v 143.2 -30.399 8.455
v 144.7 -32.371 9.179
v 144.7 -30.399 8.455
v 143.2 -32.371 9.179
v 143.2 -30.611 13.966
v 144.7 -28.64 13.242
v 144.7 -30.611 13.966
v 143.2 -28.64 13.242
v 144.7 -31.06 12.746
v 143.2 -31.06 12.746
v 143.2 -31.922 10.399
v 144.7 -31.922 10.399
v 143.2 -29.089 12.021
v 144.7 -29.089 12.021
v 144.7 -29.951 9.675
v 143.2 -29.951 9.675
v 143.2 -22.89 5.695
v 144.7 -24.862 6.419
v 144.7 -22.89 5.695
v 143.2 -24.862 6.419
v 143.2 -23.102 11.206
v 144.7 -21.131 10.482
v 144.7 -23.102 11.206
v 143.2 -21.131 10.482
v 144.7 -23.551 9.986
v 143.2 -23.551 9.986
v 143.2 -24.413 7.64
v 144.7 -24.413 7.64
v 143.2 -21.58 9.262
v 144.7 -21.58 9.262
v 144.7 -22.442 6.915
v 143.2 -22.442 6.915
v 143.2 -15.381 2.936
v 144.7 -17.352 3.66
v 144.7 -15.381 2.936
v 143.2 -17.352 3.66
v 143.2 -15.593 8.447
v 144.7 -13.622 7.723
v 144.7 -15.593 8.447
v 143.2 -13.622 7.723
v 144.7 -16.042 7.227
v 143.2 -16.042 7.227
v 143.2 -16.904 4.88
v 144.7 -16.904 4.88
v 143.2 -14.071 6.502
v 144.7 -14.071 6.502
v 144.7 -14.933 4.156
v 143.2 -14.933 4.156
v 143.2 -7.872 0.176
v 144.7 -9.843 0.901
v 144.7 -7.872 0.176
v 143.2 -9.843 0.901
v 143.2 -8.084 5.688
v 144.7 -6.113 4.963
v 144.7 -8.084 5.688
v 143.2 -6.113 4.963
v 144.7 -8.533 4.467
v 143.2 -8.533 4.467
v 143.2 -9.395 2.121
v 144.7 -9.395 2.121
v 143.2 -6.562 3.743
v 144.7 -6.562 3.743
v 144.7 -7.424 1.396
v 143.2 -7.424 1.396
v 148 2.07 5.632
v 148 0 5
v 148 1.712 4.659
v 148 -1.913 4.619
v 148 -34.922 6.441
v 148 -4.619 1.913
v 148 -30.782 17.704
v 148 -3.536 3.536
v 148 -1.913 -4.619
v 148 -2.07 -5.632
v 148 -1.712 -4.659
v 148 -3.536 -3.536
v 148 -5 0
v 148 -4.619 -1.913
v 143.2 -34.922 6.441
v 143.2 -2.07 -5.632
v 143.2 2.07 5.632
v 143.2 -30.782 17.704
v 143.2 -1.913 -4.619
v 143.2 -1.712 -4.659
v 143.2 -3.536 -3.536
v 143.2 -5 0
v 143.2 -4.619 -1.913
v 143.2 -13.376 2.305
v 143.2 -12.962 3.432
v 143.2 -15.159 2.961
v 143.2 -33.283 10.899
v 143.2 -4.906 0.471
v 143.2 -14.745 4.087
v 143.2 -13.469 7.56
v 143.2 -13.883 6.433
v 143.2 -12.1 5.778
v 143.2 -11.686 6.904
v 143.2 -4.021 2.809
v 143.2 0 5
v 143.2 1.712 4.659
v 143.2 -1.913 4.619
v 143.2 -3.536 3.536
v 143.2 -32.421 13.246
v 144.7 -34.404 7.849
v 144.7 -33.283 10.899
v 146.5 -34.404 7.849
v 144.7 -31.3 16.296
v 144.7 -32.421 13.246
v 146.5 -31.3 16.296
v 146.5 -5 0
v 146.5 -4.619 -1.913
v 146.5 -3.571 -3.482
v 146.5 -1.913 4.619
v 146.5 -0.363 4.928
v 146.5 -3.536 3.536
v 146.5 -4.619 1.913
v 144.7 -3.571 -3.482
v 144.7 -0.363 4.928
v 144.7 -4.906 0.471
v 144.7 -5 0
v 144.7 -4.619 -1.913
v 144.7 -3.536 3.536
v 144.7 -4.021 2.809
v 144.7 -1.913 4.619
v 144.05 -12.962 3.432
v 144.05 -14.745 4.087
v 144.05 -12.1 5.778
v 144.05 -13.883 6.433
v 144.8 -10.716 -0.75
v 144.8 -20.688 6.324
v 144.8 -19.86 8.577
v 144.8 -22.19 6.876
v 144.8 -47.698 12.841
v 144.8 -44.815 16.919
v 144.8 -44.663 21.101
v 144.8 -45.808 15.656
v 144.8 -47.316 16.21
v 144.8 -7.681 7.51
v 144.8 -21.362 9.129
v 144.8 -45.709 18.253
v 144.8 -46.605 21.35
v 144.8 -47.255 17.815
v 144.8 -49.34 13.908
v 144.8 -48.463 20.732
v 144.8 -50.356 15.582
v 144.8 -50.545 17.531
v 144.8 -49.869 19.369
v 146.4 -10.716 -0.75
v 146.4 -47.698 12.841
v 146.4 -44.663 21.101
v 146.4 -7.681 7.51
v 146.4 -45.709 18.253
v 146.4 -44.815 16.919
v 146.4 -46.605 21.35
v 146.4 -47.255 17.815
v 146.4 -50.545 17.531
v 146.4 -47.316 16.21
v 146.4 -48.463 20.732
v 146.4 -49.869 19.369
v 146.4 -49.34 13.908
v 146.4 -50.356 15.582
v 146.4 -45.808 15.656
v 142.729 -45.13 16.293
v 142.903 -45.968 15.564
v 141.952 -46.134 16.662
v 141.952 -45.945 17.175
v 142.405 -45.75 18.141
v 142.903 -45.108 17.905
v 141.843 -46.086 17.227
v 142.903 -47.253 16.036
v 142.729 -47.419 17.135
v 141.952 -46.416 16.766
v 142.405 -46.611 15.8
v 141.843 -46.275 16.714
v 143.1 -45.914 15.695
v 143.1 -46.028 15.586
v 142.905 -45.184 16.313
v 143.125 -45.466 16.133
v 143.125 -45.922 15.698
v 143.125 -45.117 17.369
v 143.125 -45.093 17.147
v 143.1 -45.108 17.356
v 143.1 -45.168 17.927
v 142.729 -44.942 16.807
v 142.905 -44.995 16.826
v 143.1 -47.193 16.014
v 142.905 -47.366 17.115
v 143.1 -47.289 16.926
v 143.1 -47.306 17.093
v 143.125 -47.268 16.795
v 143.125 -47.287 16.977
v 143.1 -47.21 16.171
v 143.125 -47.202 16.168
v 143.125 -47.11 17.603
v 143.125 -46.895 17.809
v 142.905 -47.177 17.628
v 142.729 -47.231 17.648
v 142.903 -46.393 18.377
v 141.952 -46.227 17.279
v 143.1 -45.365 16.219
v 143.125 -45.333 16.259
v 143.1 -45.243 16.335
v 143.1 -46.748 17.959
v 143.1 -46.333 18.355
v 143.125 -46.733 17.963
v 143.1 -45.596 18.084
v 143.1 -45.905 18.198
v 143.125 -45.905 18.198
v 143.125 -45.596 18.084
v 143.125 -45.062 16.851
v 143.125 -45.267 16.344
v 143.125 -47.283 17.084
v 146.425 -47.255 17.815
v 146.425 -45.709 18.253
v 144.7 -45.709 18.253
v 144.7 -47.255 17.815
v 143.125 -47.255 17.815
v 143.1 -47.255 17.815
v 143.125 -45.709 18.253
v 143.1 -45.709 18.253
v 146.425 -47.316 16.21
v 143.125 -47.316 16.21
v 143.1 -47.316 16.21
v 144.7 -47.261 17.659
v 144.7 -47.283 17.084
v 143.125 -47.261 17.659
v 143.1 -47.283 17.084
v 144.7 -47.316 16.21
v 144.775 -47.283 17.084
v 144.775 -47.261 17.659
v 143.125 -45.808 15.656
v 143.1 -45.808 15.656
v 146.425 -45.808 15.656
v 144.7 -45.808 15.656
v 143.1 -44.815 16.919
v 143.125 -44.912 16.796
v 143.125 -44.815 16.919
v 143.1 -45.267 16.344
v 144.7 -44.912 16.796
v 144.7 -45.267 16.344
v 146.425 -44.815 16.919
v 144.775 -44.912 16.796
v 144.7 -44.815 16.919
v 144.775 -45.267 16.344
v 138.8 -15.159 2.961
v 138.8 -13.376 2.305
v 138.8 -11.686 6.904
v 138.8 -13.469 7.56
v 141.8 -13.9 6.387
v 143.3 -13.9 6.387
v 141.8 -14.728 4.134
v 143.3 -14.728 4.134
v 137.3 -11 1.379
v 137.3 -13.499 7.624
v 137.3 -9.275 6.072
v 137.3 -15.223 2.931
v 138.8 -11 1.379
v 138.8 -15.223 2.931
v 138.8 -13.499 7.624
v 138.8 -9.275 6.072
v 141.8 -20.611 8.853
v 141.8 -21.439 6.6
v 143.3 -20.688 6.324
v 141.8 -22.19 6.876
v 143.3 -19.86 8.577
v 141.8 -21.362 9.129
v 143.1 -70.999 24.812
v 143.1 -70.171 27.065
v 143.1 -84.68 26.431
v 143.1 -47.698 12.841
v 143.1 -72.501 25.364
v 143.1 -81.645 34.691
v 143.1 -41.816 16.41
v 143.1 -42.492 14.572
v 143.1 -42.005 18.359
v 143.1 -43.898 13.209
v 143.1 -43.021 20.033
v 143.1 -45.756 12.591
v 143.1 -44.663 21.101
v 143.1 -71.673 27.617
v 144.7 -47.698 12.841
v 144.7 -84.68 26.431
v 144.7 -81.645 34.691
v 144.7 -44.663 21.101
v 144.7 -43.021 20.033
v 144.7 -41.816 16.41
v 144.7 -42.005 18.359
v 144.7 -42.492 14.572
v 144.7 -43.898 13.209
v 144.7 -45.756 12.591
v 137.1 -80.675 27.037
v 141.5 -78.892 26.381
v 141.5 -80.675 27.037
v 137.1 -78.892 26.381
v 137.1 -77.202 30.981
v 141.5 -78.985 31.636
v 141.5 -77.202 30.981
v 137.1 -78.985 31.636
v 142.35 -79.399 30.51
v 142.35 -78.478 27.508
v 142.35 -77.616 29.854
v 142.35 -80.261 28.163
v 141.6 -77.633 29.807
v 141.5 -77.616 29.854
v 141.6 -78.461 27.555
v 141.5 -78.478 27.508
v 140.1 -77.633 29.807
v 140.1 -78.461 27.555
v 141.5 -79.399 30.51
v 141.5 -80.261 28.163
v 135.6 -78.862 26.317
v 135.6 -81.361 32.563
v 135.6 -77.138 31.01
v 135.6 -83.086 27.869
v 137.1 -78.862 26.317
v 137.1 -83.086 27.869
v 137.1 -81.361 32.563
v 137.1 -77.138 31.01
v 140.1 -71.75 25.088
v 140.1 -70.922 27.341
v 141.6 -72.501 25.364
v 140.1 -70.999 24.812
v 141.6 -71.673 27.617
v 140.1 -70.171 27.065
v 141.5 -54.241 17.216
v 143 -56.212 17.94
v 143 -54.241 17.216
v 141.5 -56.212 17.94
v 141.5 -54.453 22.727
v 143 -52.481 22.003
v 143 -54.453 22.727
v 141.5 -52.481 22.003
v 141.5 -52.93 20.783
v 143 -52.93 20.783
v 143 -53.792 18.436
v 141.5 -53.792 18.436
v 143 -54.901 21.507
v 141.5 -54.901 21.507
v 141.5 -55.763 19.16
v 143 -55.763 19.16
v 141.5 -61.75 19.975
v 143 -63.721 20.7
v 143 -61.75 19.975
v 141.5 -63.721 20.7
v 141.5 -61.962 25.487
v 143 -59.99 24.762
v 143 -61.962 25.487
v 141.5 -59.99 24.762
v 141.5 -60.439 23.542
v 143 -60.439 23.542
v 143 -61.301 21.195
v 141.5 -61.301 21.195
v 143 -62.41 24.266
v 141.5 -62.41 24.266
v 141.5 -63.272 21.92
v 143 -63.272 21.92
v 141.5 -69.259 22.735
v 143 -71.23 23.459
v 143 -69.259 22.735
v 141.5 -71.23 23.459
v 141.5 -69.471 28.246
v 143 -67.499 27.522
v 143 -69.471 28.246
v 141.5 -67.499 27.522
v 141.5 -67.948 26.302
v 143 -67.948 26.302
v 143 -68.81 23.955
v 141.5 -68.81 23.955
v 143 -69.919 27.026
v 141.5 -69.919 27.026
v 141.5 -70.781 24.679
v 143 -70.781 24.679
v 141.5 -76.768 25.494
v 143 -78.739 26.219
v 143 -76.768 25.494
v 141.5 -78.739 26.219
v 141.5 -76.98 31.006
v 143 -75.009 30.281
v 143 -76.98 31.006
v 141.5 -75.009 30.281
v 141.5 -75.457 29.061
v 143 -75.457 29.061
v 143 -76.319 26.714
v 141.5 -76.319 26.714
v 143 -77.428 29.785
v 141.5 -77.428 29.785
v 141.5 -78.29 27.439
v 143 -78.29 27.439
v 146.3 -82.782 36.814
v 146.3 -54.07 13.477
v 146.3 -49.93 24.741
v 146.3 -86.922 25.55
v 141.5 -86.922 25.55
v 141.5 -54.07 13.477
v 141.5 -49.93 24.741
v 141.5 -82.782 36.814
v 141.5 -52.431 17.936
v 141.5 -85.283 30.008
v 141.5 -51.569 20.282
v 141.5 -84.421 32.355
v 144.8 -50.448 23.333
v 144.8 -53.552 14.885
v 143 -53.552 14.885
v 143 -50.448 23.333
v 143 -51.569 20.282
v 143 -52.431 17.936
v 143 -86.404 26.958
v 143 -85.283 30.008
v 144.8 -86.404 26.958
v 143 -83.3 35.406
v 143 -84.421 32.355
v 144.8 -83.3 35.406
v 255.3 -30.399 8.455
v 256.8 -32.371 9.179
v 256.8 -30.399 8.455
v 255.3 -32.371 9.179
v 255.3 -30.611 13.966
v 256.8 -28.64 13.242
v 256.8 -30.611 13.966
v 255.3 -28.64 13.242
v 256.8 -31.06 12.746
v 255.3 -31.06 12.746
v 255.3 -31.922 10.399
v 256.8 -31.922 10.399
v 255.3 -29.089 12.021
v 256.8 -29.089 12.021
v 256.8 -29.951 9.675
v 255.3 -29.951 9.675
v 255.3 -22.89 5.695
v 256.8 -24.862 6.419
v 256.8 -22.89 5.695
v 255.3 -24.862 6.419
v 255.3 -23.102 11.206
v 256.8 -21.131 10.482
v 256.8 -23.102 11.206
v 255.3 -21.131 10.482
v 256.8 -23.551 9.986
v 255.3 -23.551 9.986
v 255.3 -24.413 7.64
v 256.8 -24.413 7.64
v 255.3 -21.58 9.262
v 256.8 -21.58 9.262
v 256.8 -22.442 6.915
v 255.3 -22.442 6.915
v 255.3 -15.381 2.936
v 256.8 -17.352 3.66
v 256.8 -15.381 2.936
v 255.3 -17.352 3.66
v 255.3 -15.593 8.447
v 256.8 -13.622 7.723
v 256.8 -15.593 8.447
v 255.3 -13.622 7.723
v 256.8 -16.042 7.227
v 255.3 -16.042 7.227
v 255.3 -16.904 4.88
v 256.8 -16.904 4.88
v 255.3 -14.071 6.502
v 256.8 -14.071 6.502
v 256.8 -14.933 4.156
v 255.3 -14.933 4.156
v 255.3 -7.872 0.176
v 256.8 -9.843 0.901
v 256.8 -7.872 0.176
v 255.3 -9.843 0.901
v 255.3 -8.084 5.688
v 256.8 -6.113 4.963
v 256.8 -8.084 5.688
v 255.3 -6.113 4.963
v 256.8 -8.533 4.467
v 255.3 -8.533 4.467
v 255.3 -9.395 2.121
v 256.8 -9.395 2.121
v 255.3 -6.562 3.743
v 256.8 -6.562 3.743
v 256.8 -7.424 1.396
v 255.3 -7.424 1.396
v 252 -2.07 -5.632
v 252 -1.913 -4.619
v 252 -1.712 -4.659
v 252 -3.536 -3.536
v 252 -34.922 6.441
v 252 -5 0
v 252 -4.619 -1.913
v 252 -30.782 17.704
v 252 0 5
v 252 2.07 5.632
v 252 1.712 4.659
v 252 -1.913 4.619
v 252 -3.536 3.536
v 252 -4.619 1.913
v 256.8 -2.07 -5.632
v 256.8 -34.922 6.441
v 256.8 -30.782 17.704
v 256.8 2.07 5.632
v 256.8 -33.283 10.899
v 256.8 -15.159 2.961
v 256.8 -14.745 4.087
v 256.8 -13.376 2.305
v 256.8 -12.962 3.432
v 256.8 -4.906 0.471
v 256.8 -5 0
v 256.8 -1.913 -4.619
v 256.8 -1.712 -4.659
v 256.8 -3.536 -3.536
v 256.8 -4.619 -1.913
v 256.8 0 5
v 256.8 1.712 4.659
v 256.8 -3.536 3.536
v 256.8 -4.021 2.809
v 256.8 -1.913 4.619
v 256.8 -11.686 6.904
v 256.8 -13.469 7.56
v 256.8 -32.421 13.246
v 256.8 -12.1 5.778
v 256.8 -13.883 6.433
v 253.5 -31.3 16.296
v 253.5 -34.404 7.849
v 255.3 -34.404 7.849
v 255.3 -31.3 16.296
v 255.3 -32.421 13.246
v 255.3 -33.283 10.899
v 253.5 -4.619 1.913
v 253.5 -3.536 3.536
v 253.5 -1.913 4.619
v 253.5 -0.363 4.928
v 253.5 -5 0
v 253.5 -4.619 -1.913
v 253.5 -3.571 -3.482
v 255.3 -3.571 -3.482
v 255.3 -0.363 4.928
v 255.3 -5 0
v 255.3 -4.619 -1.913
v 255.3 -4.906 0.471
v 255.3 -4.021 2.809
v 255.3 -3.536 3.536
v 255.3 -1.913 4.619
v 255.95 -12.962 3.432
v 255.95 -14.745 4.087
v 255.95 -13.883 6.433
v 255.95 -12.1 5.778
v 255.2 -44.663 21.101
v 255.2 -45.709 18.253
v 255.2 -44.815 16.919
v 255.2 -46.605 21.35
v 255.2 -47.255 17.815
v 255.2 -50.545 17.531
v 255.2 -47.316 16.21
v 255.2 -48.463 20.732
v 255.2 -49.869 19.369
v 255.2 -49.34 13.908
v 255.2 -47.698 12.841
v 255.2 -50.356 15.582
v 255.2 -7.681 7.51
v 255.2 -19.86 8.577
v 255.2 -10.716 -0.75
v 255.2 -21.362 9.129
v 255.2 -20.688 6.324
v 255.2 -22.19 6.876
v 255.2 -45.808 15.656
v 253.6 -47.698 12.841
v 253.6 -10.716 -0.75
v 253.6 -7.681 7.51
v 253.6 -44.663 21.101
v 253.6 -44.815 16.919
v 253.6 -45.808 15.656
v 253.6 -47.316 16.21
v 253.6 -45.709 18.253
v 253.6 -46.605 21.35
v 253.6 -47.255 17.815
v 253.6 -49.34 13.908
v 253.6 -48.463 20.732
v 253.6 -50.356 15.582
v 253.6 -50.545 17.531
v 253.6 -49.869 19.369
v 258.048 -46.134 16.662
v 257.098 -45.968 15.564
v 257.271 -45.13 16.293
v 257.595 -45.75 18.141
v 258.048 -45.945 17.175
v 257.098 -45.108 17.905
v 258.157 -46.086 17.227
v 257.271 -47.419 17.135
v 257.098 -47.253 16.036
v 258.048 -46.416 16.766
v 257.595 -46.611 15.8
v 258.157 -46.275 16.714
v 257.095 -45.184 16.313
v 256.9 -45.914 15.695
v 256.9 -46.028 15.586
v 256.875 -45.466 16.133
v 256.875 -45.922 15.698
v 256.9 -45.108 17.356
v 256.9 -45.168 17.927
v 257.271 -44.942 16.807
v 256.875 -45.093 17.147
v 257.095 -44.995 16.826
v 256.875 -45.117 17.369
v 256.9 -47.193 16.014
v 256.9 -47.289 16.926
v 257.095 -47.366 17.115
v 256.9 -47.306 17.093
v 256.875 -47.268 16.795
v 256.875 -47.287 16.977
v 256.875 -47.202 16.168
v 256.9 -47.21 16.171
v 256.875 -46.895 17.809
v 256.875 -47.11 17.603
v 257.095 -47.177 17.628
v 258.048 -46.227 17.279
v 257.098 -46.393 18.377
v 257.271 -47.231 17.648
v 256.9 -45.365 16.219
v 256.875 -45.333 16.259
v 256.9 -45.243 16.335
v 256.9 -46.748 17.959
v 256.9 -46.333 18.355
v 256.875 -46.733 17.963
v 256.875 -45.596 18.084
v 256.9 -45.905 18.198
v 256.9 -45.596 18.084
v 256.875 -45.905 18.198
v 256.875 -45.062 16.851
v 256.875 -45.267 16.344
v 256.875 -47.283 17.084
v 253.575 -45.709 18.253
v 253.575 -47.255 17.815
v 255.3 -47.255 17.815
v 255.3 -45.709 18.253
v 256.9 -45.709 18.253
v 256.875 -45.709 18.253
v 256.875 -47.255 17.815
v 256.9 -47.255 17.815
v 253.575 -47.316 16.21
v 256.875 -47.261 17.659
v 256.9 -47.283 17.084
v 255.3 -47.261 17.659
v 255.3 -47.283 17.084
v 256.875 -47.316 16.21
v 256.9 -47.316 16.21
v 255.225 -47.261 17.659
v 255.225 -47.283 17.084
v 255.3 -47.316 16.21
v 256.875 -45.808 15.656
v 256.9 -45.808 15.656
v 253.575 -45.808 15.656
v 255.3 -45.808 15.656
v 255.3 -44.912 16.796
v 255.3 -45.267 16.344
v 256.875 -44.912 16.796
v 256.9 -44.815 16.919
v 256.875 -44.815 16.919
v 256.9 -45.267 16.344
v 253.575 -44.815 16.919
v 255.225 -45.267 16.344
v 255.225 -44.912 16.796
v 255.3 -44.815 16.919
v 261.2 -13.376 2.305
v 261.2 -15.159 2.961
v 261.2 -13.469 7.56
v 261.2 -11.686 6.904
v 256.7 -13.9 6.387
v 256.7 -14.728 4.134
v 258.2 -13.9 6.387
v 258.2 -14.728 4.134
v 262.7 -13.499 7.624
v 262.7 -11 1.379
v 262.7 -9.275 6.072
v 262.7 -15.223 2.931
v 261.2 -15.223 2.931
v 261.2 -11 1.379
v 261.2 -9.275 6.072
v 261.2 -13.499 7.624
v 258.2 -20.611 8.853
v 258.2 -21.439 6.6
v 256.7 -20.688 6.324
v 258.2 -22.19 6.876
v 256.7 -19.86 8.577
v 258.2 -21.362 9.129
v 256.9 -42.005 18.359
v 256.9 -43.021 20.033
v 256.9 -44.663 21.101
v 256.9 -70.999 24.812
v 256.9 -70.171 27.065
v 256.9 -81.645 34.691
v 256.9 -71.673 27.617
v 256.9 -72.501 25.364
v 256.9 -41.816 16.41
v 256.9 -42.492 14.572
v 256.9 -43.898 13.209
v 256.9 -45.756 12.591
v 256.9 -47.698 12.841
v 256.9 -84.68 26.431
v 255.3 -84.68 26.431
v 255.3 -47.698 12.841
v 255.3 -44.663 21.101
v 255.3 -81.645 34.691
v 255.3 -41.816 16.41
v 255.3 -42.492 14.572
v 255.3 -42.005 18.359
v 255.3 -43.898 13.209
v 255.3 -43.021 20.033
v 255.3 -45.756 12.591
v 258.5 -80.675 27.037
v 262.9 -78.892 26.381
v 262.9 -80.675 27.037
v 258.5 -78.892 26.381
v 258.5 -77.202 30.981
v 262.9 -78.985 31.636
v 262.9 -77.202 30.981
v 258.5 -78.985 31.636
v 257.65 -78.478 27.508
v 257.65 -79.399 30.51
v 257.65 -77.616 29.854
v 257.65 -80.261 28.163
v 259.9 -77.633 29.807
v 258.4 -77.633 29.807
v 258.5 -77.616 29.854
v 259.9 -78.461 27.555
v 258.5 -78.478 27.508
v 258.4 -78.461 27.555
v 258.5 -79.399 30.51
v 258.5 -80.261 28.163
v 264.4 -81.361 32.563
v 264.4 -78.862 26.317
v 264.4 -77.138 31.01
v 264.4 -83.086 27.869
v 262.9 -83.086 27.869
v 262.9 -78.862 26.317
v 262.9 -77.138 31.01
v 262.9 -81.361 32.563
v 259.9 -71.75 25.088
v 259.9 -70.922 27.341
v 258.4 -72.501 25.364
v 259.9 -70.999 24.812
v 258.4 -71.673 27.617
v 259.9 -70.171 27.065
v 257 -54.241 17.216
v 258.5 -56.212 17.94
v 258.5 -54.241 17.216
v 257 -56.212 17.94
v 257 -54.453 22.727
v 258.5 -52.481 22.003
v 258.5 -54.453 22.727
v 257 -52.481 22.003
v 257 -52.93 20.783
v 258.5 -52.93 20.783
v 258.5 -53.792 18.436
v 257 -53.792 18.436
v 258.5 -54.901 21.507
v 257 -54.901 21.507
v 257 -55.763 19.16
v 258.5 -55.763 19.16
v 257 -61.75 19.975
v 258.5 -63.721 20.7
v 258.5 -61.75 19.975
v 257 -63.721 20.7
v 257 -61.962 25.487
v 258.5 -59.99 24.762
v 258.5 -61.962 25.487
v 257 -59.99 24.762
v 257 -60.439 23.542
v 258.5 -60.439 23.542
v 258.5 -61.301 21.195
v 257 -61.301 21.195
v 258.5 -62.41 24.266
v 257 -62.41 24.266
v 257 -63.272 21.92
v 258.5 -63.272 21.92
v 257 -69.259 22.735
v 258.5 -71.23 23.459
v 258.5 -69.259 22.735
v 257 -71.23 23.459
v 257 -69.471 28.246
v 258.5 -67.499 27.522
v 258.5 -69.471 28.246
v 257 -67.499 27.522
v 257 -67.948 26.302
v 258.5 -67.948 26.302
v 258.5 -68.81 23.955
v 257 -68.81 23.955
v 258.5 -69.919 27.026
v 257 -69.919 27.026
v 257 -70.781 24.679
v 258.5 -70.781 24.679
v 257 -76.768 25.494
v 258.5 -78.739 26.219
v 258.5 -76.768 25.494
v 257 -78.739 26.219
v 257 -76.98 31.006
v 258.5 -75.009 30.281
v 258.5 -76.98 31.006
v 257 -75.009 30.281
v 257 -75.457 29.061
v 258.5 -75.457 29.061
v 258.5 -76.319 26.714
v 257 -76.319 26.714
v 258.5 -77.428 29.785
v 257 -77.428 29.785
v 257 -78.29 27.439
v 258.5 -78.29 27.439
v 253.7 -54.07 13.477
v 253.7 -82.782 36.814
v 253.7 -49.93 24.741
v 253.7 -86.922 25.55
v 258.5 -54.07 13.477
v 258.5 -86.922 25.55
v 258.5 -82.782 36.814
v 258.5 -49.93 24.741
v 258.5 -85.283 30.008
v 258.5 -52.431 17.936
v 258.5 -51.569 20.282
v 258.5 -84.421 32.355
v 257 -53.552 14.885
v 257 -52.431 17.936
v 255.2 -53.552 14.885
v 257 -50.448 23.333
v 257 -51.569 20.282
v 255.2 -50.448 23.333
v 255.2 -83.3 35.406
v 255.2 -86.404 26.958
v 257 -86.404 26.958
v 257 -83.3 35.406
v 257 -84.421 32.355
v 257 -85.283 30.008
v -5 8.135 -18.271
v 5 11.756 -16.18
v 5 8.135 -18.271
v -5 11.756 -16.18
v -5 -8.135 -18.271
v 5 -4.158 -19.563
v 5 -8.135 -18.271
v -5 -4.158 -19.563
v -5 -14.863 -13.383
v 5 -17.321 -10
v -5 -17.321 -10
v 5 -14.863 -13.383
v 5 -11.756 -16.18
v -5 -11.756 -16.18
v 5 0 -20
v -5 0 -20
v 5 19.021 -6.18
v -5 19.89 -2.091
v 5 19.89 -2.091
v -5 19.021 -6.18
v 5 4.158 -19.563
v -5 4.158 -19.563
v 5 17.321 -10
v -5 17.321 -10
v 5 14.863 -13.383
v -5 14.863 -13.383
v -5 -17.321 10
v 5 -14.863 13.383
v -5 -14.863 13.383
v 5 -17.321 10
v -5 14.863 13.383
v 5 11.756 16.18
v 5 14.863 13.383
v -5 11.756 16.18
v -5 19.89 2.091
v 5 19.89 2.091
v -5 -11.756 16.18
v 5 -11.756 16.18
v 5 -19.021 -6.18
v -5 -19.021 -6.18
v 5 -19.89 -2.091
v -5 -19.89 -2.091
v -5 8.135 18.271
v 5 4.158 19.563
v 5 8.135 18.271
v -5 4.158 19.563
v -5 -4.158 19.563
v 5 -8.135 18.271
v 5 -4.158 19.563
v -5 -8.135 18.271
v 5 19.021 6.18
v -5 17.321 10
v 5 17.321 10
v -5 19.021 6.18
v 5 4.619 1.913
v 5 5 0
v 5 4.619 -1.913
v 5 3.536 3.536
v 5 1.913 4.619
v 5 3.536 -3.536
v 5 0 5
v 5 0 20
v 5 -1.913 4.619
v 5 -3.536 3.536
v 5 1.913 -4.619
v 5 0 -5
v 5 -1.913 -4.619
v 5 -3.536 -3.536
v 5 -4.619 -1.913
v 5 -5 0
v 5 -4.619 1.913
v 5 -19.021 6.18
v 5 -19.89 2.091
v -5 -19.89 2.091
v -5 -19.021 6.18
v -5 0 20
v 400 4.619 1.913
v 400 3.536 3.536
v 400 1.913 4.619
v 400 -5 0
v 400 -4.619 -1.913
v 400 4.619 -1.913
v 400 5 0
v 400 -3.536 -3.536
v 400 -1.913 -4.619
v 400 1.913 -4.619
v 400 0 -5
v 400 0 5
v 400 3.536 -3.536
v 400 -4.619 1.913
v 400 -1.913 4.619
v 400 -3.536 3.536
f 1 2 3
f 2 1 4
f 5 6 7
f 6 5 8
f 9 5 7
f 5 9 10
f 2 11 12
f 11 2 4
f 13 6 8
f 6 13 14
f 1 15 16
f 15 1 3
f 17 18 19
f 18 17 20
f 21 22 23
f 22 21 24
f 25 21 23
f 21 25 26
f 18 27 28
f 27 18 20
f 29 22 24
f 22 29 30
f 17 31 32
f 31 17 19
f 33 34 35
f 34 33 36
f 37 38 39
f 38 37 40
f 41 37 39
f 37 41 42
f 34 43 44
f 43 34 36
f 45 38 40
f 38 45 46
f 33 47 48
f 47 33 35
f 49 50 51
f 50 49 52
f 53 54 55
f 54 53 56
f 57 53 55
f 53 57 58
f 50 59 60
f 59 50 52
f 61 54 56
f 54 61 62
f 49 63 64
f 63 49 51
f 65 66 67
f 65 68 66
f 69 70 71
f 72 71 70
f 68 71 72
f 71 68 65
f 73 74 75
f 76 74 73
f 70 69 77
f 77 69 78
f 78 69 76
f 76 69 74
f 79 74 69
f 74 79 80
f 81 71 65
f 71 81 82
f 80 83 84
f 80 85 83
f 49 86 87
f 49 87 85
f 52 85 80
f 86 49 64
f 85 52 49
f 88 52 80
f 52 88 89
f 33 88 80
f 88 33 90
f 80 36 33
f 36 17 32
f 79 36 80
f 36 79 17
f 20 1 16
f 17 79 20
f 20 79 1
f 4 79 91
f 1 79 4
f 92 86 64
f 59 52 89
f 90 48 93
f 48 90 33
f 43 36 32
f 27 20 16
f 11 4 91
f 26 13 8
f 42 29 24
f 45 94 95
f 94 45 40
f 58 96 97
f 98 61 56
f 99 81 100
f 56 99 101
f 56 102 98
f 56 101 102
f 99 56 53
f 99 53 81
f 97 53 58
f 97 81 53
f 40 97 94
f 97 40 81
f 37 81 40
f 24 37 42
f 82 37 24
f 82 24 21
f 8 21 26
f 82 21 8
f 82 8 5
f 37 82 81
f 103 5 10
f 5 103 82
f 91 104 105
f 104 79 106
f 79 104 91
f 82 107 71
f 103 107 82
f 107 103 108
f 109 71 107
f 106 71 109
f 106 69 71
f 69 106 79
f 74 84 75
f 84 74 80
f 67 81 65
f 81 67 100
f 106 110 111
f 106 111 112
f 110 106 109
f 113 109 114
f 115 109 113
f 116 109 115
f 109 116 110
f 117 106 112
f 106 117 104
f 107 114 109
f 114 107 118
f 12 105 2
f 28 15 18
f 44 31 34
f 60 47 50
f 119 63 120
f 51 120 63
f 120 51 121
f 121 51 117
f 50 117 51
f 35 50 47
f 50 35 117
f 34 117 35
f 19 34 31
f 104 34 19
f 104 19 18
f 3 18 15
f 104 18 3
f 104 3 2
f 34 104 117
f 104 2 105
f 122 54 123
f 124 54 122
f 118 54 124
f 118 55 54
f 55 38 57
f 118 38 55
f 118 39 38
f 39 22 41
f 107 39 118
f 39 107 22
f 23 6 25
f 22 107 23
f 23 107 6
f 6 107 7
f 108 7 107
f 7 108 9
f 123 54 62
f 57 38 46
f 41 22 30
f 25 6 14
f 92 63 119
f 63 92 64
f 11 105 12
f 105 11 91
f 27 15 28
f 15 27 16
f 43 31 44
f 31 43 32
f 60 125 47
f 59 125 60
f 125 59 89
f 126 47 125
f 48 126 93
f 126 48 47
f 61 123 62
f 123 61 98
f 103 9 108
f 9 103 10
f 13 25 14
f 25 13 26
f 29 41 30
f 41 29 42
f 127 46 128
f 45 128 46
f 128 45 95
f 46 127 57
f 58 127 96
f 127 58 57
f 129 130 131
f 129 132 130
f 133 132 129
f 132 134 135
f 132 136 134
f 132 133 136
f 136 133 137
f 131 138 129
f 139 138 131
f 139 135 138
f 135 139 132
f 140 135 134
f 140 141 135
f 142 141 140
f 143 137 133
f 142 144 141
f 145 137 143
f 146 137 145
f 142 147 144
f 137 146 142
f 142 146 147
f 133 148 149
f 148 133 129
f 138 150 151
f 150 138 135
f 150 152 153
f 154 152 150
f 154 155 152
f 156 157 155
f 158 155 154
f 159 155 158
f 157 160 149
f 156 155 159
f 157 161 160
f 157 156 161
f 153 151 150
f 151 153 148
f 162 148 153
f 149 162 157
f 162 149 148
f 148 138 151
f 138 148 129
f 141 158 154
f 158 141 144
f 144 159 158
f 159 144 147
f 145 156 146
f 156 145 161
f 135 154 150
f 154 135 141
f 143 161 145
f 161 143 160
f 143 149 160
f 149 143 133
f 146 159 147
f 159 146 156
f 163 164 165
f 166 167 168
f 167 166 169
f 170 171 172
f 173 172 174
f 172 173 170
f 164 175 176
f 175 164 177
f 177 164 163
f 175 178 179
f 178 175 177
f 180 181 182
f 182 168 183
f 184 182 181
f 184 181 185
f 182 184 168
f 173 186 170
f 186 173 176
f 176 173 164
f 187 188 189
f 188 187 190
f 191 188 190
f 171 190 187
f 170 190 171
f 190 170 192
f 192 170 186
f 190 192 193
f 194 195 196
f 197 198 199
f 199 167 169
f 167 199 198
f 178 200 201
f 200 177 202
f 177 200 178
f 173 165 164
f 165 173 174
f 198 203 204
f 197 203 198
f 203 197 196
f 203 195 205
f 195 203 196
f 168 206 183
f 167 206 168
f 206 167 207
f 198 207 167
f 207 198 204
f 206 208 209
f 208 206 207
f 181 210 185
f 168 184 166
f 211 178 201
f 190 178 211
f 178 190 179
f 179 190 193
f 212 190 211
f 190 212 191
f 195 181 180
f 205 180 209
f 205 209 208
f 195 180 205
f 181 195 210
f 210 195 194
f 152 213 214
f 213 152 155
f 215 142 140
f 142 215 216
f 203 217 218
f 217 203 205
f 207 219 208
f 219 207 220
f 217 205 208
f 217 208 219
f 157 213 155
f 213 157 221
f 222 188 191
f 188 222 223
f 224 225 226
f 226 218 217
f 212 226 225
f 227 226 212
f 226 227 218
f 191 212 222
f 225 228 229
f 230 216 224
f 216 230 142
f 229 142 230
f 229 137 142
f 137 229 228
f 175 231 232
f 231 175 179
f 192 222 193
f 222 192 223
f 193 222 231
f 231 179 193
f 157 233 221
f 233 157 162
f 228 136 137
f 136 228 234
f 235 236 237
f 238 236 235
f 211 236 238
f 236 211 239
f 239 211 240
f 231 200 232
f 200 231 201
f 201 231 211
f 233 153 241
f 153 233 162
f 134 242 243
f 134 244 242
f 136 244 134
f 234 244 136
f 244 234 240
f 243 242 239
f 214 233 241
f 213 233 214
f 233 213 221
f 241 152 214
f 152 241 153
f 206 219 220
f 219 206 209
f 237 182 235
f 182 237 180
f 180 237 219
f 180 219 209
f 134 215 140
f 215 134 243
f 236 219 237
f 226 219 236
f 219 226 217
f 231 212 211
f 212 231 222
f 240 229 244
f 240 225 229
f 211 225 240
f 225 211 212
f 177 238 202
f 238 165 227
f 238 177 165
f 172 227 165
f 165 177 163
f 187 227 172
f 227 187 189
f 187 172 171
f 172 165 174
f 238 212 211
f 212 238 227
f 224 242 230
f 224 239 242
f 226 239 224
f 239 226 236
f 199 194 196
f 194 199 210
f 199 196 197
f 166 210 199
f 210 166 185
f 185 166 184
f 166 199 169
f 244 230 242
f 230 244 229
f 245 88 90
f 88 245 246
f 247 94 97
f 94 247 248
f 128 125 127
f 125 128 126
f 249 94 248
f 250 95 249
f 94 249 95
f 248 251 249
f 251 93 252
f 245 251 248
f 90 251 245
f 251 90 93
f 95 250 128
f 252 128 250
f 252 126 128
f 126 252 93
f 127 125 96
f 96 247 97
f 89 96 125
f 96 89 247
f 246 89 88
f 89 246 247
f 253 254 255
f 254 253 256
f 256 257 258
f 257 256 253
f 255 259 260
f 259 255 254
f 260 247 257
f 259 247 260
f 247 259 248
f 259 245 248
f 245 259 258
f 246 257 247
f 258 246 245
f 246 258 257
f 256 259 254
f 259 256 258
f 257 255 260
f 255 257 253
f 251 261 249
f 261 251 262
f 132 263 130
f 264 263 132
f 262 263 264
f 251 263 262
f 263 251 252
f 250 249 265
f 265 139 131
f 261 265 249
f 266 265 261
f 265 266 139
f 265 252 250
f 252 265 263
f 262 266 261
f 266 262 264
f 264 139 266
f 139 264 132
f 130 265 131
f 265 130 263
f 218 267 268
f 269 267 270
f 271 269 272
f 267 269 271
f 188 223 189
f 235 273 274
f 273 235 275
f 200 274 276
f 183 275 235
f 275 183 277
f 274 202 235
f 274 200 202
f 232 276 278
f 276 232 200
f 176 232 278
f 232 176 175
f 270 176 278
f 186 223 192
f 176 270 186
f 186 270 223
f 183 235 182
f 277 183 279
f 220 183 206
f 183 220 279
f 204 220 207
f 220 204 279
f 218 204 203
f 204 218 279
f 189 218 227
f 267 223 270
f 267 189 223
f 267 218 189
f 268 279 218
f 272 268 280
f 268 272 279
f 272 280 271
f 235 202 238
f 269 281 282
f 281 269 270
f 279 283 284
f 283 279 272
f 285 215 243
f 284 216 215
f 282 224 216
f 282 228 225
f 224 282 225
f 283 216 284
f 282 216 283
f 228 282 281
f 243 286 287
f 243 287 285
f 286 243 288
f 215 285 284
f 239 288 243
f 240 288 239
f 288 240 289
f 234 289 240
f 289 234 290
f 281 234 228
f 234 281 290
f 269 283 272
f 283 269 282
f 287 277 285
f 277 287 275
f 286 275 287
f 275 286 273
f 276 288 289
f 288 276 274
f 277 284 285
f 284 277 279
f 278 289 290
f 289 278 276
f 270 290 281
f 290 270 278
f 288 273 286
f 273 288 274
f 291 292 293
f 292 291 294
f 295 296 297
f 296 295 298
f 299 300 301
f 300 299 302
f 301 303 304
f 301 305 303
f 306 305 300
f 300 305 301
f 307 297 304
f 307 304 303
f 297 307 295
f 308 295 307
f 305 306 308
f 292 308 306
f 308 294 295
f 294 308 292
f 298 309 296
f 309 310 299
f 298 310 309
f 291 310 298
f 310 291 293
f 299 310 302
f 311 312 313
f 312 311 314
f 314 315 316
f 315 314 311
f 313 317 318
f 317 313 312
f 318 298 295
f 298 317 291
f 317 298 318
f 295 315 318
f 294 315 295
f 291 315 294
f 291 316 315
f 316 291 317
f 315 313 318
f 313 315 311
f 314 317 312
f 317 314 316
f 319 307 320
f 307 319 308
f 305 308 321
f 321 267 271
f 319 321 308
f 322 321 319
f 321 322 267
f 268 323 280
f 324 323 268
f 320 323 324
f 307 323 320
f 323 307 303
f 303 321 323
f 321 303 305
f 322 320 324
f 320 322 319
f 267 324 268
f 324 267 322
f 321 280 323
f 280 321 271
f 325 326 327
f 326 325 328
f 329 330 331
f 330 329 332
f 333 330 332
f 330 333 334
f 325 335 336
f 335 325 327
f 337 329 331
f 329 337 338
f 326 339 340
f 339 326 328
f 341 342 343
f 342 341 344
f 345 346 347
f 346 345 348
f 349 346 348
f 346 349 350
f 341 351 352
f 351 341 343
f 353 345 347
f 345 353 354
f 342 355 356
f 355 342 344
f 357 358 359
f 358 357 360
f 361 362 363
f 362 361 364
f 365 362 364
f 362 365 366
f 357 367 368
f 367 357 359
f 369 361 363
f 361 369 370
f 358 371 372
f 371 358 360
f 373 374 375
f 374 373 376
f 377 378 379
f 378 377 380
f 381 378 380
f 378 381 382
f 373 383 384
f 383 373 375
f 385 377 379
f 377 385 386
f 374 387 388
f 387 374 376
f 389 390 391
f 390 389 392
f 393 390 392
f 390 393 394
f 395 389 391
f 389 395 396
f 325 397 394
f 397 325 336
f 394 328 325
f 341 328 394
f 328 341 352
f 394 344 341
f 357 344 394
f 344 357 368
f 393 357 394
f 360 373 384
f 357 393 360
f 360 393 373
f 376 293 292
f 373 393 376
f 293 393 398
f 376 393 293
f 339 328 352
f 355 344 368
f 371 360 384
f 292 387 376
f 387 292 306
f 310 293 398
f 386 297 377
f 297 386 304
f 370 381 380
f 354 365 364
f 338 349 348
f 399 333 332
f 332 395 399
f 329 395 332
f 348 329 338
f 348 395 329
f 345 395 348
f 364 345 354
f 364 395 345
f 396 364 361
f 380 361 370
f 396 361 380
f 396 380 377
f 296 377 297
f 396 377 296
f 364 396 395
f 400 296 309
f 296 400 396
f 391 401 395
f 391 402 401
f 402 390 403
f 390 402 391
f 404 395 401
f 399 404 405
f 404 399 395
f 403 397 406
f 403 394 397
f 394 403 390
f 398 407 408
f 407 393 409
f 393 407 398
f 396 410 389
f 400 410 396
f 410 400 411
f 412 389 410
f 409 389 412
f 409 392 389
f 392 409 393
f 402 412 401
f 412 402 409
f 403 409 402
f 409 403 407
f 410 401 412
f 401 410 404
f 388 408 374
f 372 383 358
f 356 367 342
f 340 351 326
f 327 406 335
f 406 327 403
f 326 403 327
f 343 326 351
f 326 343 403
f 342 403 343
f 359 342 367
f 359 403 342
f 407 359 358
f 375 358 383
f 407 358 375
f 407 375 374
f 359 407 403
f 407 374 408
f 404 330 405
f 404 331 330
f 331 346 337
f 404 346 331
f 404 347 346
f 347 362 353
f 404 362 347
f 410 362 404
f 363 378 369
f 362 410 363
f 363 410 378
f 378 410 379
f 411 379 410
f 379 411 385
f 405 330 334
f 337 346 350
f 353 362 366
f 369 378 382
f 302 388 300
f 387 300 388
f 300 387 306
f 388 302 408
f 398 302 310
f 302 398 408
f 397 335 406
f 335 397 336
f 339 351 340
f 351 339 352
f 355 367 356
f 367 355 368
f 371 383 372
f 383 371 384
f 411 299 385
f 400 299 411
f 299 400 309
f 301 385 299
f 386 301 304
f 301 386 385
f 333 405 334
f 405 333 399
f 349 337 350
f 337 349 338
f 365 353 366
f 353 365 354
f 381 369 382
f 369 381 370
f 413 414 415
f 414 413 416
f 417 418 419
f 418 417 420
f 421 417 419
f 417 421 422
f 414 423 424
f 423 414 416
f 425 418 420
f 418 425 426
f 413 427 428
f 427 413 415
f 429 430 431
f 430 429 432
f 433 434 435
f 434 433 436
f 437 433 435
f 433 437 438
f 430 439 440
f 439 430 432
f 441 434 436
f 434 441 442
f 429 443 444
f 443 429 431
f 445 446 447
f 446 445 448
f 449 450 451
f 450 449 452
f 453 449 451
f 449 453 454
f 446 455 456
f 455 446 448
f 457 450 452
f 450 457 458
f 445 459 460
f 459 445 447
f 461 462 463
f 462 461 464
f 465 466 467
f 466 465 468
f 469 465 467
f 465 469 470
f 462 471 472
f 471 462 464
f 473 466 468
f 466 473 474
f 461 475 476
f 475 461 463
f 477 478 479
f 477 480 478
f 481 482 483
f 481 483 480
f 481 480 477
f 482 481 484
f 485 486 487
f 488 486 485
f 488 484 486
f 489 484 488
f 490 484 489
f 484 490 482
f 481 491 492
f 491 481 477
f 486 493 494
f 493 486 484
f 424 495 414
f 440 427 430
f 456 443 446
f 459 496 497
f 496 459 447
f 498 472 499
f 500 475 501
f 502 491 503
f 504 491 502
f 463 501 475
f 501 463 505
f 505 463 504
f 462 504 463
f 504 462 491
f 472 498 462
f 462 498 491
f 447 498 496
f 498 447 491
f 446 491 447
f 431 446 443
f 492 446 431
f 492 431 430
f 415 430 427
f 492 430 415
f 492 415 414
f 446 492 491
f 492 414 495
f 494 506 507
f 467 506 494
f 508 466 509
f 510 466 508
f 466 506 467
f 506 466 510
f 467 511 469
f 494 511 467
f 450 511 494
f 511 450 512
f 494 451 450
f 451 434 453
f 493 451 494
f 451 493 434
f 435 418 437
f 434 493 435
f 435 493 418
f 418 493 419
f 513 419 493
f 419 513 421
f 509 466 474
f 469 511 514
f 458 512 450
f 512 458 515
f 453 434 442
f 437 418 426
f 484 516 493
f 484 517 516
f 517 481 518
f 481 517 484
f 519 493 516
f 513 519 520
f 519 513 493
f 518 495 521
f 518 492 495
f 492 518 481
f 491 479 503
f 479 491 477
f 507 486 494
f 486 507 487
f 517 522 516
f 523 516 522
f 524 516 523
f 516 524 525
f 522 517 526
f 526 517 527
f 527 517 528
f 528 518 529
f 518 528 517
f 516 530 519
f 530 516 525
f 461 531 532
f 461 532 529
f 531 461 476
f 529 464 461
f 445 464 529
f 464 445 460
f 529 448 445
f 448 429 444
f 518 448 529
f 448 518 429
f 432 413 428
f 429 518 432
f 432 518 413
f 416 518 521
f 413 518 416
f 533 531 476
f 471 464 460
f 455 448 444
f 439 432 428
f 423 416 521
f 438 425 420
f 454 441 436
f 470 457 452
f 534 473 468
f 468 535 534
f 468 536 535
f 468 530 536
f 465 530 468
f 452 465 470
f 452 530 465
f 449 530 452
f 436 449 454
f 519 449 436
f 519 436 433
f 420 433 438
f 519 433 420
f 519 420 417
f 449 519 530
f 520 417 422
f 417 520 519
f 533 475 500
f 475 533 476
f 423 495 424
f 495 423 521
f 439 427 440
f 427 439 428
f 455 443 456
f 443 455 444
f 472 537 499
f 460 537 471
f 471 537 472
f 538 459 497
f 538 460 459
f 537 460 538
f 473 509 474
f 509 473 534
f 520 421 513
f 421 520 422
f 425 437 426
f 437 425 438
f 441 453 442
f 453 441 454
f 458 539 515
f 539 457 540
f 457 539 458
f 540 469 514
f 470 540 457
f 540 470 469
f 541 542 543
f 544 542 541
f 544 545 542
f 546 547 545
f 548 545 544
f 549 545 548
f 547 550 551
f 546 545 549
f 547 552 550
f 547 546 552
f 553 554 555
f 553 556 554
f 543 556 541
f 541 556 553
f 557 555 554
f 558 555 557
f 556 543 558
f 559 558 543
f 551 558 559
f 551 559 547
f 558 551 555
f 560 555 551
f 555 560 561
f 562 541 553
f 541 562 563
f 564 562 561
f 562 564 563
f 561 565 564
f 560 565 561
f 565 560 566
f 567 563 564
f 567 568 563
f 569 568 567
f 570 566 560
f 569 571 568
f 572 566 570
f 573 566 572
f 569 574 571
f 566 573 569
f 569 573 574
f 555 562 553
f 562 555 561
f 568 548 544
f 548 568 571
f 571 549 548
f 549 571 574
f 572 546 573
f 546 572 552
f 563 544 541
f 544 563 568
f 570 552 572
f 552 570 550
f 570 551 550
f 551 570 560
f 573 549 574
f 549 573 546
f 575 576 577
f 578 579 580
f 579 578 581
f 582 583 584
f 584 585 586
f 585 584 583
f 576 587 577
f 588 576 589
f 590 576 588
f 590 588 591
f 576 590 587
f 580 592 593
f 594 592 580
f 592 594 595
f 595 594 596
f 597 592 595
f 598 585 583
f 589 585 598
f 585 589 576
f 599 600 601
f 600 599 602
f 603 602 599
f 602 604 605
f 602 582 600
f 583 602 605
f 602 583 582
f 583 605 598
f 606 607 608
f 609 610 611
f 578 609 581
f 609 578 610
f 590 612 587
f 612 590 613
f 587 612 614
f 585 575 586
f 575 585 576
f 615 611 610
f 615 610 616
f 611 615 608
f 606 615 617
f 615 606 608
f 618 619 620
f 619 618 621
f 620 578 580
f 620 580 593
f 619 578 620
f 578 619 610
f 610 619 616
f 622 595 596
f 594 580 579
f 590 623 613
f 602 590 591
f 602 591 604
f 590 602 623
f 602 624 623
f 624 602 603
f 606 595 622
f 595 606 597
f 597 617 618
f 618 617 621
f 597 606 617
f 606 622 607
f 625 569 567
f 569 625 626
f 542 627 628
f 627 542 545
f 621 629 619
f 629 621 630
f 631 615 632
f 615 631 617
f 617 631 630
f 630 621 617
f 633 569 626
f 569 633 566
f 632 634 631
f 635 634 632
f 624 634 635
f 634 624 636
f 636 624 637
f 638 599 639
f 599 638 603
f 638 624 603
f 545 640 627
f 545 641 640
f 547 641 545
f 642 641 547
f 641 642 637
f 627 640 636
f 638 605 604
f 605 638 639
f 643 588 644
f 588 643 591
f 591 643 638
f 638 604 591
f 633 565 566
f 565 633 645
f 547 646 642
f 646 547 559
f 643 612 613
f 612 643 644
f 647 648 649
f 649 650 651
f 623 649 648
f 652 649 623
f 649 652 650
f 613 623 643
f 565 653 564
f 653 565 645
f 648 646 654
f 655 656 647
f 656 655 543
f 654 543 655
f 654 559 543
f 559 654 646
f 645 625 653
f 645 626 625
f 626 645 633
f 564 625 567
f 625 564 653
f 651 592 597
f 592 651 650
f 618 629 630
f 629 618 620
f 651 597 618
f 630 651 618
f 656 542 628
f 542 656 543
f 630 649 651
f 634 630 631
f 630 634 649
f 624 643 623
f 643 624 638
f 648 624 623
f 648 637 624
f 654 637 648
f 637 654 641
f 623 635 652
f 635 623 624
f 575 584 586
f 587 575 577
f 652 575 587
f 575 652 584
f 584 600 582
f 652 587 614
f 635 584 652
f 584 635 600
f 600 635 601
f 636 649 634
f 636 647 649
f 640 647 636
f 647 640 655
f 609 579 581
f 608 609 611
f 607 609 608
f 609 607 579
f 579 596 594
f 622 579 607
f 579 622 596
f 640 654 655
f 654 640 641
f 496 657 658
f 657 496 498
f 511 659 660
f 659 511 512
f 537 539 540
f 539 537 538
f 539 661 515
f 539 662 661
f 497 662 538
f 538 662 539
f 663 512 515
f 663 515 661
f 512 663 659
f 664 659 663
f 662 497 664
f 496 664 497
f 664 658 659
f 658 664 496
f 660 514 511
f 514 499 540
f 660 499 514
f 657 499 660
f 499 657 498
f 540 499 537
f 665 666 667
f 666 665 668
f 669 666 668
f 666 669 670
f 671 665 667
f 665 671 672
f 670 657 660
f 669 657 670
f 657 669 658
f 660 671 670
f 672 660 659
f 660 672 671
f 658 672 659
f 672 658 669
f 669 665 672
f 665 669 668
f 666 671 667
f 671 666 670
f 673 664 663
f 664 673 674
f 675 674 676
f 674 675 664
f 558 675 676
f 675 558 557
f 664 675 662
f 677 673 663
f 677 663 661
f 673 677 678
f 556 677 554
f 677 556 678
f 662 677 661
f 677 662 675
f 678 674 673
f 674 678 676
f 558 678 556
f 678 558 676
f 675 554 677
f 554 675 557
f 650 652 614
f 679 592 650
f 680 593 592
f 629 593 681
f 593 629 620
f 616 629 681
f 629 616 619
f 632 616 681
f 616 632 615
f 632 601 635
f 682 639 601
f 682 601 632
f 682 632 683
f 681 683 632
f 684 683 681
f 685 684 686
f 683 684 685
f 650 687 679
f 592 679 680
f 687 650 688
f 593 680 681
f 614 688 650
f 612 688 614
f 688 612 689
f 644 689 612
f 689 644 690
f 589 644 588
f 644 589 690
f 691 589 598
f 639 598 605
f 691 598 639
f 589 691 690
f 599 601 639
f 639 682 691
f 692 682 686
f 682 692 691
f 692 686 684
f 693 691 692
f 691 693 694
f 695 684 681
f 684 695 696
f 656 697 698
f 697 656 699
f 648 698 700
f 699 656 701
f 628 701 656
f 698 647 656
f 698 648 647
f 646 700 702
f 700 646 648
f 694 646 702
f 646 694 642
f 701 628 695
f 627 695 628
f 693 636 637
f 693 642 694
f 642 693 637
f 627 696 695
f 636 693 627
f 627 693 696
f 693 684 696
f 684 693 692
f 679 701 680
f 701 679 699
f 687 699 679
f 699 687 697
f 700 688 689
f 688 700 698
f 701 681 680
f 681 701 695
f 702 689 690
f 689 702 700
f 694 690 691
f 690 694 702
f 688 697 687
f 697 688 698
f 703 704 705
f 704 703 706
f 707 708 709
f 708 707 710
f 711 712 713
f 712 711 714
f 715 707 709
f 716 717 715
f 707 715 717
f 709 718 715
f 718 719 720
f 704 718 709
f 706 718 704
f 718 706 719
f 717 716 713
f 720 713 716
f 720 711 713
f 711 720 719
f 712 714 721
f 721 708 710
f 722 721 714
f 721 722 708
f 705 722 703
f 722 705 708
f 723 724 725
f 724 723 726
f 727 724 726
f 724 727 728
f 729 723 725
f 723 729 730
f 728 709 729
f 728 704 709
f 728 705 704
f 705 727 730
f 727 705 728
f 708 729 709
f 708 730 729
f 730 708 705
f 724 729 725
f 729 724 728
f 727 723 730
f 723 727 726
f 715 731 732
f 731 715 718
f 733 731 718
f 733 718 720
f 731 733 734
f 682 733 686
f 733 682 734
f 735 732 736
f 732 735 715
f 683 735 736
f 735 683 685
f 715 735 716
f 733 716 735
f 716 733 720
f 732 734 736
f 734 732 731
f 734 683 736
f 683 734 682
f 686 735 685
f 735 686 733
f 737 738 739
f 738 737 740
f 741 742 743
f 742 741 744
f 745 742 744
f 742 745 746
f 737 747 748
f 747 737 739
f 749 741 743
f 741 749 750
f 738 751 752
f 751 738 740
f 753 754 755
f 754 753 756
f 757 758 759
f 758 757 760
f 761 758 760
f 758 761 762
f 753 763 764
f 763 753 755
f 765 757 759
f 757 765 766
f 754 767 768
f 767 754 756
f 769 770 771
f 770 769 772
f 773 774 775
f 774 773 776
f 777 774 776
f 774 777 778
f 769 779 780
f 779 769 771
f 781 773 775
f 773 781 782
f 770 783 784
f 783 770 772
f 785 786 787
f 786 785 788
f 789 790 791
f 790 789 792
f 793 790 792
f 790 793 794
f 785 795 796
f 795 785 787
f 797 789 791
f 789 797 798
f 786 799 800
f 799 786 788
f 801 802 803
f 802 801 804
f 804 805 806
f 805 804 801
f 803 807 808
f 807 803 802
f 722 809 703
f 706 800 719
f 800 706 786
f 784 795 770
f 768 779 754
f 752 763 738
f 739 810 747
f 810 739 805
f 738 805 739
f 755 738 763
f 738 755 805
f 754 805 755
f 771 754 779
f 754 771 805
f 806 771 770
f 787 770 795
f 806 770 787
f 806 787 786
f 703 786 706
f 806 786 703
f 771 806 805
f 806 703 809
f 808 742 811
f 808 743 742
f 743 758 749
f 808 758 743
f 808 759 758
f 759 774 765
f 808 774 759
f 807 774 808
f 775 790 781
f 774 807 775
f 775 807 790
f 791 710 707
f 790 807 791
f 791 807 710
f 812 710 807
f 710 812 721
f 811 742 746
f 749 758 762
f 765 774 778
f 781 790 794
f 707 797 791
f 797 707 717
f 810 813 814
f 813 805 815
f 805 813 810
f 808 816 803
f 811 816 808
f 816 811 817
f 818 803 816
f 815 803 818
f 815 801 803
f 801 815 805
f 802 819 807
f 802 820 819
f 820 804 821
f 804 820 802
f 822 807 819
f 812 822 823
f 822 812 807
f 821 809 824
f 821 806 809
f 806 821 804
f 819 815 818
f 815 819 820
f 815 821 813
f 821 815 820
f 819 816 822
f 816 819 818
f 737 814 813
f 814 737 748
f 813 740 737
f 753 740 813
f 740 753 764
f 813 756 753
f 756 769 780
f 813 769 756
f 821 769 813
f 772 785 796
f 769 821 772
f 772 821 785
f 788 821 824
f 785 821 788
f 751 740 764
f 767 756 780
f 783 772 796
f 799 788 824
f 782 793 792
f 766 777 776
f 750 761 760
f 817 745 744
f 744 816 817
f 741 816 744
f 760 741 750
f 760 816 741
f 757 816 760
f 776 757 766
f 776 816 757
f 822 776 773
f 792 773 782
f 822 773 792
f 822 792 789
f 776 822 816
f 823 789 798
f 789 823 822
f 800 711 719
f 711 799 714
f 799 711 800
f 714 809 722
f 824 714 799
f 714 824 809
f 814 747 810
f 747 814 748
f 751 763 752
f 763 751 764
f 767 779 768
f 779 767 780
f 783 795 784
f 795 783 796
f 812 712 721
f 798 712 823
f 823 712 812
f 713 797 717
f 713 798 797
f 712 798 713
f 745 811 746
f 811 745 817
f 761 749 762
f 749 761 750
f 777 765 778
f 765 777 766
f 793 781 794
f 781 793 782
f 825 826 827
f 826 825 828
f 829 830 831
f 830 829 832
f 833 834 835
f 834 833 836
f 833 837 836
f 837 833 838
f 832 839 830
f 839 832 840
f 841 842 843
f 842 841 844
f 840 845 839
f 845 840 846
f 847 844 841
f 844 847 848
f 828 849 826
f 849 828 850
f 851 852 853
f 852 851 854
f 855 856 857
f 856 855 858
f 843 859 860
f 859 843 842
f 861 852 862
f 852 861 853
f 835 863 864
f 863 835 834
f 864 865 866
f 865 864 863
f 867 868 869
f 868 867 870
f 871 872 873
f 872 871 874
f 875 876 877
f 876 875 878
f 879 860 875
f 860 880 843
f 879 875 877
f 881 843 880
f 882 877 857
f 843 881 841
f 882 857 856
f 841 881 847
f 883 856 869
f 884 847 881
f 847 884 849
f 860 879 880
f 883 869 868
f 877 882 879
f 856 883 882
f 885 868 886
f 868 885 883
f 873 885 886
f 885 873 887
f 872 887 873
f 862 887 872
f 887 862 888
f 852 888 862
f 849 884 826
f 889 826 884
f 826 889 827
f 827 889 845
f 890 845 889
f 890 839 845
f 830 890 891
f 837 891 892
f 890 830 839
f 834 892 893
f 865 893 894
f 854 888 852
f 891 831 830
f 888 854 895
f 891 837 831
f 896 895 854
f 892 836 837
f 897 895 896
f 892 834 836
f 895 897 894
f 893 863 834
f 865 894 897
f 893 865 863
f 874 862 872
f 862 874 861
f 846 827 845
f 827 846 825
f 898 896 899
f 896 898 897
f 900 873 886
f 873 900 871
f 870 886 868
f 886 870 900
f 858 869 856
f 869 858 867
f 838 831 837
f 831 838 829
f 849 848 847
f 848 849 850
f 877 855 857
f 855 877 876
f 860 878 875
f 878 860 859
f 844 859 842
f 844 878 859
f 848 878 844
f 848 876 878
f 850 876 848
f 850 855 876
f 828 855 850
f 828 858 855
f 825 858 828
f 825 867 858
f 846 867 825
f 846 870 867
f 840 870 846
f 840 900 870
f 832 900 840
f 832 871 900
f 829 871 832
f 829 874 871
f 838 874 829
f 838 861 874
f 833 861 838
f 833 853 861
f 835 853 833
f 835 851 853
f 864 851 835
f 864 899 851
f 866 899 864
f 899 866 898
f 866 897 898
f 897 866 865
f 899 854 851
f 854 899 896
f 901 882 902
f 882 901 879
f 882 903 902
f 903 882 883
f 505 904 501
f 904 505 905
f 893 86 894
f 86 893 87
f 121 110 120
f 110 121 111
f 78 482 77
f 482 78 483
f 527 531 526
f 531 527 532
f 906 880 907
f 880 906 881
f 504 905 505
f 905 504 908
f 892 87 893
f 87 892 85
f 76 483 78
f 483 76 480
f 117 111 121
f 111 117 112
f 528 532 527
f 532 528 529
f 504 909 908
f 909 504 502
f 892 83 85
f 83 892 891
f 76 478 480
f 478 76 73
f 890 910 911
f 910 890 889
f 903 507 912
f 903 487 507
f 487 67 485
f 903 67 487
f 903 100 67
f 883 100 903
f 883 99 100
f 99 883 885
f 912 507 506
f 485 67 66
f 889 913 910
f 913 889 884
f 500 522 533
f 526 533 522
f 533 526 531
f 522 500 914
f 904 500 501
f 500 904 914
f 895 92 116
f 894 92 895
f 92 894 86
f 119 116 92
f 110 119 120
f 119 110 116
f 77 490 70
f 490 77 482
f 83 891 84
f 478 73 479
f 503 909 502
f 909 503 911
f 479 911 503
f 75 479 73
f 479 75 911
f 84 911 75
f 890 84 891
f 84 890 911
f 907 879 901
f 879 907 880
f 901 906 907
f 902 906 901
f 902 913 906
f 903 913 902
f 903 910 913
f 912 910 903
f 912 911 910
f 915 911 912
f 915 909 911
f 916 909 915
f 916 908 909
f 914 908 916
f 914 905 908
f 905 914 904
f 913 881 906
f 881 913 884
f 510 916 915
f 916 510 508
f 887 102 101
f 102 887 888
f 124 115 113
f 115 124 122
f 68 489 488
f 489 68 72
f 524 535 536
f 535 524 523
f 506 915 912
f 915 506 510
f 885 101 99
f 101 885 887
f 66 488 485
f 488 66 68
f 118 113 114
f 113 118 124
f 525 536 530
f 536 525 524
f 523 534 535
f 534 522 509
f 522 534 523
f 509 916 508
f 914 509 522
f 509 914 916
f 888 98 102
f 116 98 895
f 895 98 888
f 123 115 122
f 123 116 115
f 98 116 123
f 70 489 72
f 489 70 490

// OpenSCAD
// file: paddle_bar.scad
include <parameters.scad>;

module paddle_bar(){
	cylinder(h= paddle_bar_h,r=paddle_bar_r);
}

paddle_bar();
// file: paddle_upper.scad
include <paddle_bar.scad>;

module paddle_upper(){
	notches = round((paddle_upper_l-hook_t-shell*2)/upper_length_resolution-0.5);

	difference(){
		cube([paddle_upper_t, paddle_upper_l, paddle_upper_w], center = true);
		cube([paddle_upper_t-shell*2, paddle_upper_l+1, paddle_upper_w-shell*2], center = true);
		translate([-paddle_upper_t/2,0,0])
			cube([paddle_upper_t, paddle_upper_l+1, groove], center = true);
		translate([-paddle_upper_t/2,+paddle_upper_l/2-hook_t/2-shell,0])
			for(i = [0:notches]){
				translate([0,-upper_length_resolution*i,0])
					cube([paddle_upper_t+1, hook_t+hook_gap, hook_w+hook_gap], center = true);
			}
	}
}

paddle_upper();
// file: forearm.scad
include <parameters.scad>;
use <paddle_upper.scad>;

module bolt(){
	module slug(){
		rotate([0,90,0])
			cylinder(h = bolt_h, r = bolt_r, center = true);
		translate([bolt_h/2,0,0])
			difference(){
				sphere(r = head_r, center = true);
				translate([-head_r,0,0])
					cube([head_r*2,head_r*2,head_r*2], center = true);
				translate([0,head_r+bolt_r,0])
					cube([head_r*2,head_r*2,head_r*2], center = true);
				translate([0,-head_r-bolt_r,0])
					cube([head_r*2,head_r*2,head_r*2], center = true);
		}
	}
	difference(){
		slug();
		translate([bolt_h*0.5,0,0])
				cube([bolt_h,bolt_r*2+0.1,bolt_groove],center = true);
	}
}

module clip(){
	cube([clip_h ,forearm_t,groove-slide_gap], center = true);
	translate([clip_h/2-shell/2,-clip_l/2,0]){
		cube([shell,clip_l,groove-slide_gap], center = true);
		translate([hook_h/2-shell,-clip_l/2,0]){
			cube([hook_h,hook_t-slide_gap,hook_w-slide_gap],center = true);
			translate([hook_h/2,-thumb_hook_l/2+hook_t/2,0])
				cube([thumb_hook_t,thumb_hook_l,hook_w],center = true);
		}
	}
}

module forearm(bolt){
	module slug(){
		cube([forearm_t, forearm_l, forearm_w], center = true);
		translate([0,forearm_l/2,0]){
			rotate([0,90,0])
				cylinder(h = forearm_t, r = wrist_joint_outer, center = true);
		}
	}
	if(bolt){
		slug();
		translate([0,forearm_l/2,0]){
			translate([bolt_h/4,0,0]){
				bolt();
			}
		}
	}else{
		difference(){
			slug();
			translate([0,forearm_l/2,0]){
				translate([bolt_h/4,0,0]){
					bolt();
				}
			}
		}
		
	}

	translate([-forearm_t/2+clip_h/2,-forearm_l/2+clip_l+thumb_hook_l])
		clip();
}

module lower_forearm(pos2){
	translate([0,forearm_l/2,0]){
		mirror([0,1,0]){
			forearm(false);
			mirror([1,0,0])
					translate([0,-upper_length_resolution/2-upper_length_resolution*pos2,0])
						paddle_upper();
		}
	}
}

lower_forearm(1);
//forearm(true);
// file: side.scad
include <parameters.scad>;
use <forearm.scad>;
use <paddle_upper.scad>;

module side(){
	paddle_upper();
	translate([0,upper_length_resolution/2+upper_length_resolution*pos1,0]){ 
		mirror([1,0,0]){
			forearm(true);
			translate([forearm_t+slide_gap,forearm_l/2,0]){
				rotate([-wrist_angle,0,0]){
					lower_forearm(pos2);
				}
			}
		}
	}
}

side();
// file: paddle.scad
include <parameters.scad>;
use <side.scad>;

module paddle(narrow){
	separation1 = paddle_bar_h-paddle_upper_t-slide_gap*40;
	separation2 = paddle_bar_h+paddle_upper_t+slide_gap*40;
	if (narrow){
		translate([separation1/2,paddle_upper_l/2,0])
			side();
		translate([-separation1/2,paddle_upper_l/2,0])
			mirror([1,0,0])
				side();
	}else{
		translate([-separation2/2,paddle_upper_l/2,0])
			side();
		translate([separation2/2,paddle_upper_l/2,0])
			mirror([1,0,0])
				side();
	}
}

paddle(true);
paddle(false);
// file: paddle_shaft.scad
include <parameters.scad>;

module paddle_shaft(){
	cylinder(r = paddle_shaft_r, h = paddle_shaft_h, center = true);
}

paddle_shaft();
// file: paddle_gear.scad
include <parameters.scad>;

module paddle_gear(){
	cylinder(r = paddle_gear_r, h = paddle_gear_h, center = true);
}

paddle_gear();
// file: parameters.scad
//All parameters

link_gear_r = 25;
link_gear_h = 10;

paddle_gear_r = 20;
paddle_gear_h = 10;

paddle_shaft_r = 5;
paddle_shaft_h = 400;

upper_length_resolution = 8;
hook_w = 5;
hook_t = 2;
hook_gap = 0.1;
shell = 1.5;
groove = 2.5;

paddle_upper_l = 35;
paddle_upper_t = shell*3.2;
paddle_upper_w = 12;

slide_gap = 0.1;
forearm_w = paddle_upper_w-shell*2-slide_gap*2;
wrist_joint_outer = forearm_w/2;
wrist_joint_inner = wrist_joint_outer/3;

forearm_t = paddle_upper_t-shell*2-slide_gap*2;
forearm_l = paddle_upper_l+wrist_joint_outer;

bolt_r = wrist_joint_inner-slide_gap;
bolt_h = forearm_t*2+slide_gap;
bolt_groove = bolt_r*0.4;

head_hook = bolt_groove/2-slide_gap*2;
head_r = bolt_r+head_hook;

clip_l = shell*4+hook_t+slide_gap;
clip_h = shell*2+forearm_t;

thumb_hook_h = shell*2;
thumb_hook_t = shell;
thumb_hook_l = shell*3;
hook_h = shell*2+thumb_hook_h;

pos1 = 1;
pos2 = 0;
wrist_angle = 0;
paddle_upper_declination = 180;
declination_offset = (paddle_upper_w)/(paddle_upper_l*2)*(180/3.1415);

paddle_bar_h = 100;
paddle_bar_r = 10;

paddle_upper_declination = 210;
paddle_gear_elivation = 45;
// main file
include <parameters.scad>;
use <paddle_gear.scad>;
use <paddle_shaft.scad>;
use <paddle.scad>;

module arm(reverse){
	rotate([0,90,0])
		paddle_gear();
	translate([paddle_shaft_h/2,0,0])
		rotate([0,90,0])
			paddle_shaft();

	translate([paddle_shaft_h/2,0,0]){
		if(reverse){
			mirror([0,1,0])
				rotate([-paddle_upper_declination-declination_offset,0,0])
					paddle(true);
		}else{
			rotate([-paddle_upper_declination+declination_offset,0,0])
				paddle(false);
		}
	}

}

arm();
